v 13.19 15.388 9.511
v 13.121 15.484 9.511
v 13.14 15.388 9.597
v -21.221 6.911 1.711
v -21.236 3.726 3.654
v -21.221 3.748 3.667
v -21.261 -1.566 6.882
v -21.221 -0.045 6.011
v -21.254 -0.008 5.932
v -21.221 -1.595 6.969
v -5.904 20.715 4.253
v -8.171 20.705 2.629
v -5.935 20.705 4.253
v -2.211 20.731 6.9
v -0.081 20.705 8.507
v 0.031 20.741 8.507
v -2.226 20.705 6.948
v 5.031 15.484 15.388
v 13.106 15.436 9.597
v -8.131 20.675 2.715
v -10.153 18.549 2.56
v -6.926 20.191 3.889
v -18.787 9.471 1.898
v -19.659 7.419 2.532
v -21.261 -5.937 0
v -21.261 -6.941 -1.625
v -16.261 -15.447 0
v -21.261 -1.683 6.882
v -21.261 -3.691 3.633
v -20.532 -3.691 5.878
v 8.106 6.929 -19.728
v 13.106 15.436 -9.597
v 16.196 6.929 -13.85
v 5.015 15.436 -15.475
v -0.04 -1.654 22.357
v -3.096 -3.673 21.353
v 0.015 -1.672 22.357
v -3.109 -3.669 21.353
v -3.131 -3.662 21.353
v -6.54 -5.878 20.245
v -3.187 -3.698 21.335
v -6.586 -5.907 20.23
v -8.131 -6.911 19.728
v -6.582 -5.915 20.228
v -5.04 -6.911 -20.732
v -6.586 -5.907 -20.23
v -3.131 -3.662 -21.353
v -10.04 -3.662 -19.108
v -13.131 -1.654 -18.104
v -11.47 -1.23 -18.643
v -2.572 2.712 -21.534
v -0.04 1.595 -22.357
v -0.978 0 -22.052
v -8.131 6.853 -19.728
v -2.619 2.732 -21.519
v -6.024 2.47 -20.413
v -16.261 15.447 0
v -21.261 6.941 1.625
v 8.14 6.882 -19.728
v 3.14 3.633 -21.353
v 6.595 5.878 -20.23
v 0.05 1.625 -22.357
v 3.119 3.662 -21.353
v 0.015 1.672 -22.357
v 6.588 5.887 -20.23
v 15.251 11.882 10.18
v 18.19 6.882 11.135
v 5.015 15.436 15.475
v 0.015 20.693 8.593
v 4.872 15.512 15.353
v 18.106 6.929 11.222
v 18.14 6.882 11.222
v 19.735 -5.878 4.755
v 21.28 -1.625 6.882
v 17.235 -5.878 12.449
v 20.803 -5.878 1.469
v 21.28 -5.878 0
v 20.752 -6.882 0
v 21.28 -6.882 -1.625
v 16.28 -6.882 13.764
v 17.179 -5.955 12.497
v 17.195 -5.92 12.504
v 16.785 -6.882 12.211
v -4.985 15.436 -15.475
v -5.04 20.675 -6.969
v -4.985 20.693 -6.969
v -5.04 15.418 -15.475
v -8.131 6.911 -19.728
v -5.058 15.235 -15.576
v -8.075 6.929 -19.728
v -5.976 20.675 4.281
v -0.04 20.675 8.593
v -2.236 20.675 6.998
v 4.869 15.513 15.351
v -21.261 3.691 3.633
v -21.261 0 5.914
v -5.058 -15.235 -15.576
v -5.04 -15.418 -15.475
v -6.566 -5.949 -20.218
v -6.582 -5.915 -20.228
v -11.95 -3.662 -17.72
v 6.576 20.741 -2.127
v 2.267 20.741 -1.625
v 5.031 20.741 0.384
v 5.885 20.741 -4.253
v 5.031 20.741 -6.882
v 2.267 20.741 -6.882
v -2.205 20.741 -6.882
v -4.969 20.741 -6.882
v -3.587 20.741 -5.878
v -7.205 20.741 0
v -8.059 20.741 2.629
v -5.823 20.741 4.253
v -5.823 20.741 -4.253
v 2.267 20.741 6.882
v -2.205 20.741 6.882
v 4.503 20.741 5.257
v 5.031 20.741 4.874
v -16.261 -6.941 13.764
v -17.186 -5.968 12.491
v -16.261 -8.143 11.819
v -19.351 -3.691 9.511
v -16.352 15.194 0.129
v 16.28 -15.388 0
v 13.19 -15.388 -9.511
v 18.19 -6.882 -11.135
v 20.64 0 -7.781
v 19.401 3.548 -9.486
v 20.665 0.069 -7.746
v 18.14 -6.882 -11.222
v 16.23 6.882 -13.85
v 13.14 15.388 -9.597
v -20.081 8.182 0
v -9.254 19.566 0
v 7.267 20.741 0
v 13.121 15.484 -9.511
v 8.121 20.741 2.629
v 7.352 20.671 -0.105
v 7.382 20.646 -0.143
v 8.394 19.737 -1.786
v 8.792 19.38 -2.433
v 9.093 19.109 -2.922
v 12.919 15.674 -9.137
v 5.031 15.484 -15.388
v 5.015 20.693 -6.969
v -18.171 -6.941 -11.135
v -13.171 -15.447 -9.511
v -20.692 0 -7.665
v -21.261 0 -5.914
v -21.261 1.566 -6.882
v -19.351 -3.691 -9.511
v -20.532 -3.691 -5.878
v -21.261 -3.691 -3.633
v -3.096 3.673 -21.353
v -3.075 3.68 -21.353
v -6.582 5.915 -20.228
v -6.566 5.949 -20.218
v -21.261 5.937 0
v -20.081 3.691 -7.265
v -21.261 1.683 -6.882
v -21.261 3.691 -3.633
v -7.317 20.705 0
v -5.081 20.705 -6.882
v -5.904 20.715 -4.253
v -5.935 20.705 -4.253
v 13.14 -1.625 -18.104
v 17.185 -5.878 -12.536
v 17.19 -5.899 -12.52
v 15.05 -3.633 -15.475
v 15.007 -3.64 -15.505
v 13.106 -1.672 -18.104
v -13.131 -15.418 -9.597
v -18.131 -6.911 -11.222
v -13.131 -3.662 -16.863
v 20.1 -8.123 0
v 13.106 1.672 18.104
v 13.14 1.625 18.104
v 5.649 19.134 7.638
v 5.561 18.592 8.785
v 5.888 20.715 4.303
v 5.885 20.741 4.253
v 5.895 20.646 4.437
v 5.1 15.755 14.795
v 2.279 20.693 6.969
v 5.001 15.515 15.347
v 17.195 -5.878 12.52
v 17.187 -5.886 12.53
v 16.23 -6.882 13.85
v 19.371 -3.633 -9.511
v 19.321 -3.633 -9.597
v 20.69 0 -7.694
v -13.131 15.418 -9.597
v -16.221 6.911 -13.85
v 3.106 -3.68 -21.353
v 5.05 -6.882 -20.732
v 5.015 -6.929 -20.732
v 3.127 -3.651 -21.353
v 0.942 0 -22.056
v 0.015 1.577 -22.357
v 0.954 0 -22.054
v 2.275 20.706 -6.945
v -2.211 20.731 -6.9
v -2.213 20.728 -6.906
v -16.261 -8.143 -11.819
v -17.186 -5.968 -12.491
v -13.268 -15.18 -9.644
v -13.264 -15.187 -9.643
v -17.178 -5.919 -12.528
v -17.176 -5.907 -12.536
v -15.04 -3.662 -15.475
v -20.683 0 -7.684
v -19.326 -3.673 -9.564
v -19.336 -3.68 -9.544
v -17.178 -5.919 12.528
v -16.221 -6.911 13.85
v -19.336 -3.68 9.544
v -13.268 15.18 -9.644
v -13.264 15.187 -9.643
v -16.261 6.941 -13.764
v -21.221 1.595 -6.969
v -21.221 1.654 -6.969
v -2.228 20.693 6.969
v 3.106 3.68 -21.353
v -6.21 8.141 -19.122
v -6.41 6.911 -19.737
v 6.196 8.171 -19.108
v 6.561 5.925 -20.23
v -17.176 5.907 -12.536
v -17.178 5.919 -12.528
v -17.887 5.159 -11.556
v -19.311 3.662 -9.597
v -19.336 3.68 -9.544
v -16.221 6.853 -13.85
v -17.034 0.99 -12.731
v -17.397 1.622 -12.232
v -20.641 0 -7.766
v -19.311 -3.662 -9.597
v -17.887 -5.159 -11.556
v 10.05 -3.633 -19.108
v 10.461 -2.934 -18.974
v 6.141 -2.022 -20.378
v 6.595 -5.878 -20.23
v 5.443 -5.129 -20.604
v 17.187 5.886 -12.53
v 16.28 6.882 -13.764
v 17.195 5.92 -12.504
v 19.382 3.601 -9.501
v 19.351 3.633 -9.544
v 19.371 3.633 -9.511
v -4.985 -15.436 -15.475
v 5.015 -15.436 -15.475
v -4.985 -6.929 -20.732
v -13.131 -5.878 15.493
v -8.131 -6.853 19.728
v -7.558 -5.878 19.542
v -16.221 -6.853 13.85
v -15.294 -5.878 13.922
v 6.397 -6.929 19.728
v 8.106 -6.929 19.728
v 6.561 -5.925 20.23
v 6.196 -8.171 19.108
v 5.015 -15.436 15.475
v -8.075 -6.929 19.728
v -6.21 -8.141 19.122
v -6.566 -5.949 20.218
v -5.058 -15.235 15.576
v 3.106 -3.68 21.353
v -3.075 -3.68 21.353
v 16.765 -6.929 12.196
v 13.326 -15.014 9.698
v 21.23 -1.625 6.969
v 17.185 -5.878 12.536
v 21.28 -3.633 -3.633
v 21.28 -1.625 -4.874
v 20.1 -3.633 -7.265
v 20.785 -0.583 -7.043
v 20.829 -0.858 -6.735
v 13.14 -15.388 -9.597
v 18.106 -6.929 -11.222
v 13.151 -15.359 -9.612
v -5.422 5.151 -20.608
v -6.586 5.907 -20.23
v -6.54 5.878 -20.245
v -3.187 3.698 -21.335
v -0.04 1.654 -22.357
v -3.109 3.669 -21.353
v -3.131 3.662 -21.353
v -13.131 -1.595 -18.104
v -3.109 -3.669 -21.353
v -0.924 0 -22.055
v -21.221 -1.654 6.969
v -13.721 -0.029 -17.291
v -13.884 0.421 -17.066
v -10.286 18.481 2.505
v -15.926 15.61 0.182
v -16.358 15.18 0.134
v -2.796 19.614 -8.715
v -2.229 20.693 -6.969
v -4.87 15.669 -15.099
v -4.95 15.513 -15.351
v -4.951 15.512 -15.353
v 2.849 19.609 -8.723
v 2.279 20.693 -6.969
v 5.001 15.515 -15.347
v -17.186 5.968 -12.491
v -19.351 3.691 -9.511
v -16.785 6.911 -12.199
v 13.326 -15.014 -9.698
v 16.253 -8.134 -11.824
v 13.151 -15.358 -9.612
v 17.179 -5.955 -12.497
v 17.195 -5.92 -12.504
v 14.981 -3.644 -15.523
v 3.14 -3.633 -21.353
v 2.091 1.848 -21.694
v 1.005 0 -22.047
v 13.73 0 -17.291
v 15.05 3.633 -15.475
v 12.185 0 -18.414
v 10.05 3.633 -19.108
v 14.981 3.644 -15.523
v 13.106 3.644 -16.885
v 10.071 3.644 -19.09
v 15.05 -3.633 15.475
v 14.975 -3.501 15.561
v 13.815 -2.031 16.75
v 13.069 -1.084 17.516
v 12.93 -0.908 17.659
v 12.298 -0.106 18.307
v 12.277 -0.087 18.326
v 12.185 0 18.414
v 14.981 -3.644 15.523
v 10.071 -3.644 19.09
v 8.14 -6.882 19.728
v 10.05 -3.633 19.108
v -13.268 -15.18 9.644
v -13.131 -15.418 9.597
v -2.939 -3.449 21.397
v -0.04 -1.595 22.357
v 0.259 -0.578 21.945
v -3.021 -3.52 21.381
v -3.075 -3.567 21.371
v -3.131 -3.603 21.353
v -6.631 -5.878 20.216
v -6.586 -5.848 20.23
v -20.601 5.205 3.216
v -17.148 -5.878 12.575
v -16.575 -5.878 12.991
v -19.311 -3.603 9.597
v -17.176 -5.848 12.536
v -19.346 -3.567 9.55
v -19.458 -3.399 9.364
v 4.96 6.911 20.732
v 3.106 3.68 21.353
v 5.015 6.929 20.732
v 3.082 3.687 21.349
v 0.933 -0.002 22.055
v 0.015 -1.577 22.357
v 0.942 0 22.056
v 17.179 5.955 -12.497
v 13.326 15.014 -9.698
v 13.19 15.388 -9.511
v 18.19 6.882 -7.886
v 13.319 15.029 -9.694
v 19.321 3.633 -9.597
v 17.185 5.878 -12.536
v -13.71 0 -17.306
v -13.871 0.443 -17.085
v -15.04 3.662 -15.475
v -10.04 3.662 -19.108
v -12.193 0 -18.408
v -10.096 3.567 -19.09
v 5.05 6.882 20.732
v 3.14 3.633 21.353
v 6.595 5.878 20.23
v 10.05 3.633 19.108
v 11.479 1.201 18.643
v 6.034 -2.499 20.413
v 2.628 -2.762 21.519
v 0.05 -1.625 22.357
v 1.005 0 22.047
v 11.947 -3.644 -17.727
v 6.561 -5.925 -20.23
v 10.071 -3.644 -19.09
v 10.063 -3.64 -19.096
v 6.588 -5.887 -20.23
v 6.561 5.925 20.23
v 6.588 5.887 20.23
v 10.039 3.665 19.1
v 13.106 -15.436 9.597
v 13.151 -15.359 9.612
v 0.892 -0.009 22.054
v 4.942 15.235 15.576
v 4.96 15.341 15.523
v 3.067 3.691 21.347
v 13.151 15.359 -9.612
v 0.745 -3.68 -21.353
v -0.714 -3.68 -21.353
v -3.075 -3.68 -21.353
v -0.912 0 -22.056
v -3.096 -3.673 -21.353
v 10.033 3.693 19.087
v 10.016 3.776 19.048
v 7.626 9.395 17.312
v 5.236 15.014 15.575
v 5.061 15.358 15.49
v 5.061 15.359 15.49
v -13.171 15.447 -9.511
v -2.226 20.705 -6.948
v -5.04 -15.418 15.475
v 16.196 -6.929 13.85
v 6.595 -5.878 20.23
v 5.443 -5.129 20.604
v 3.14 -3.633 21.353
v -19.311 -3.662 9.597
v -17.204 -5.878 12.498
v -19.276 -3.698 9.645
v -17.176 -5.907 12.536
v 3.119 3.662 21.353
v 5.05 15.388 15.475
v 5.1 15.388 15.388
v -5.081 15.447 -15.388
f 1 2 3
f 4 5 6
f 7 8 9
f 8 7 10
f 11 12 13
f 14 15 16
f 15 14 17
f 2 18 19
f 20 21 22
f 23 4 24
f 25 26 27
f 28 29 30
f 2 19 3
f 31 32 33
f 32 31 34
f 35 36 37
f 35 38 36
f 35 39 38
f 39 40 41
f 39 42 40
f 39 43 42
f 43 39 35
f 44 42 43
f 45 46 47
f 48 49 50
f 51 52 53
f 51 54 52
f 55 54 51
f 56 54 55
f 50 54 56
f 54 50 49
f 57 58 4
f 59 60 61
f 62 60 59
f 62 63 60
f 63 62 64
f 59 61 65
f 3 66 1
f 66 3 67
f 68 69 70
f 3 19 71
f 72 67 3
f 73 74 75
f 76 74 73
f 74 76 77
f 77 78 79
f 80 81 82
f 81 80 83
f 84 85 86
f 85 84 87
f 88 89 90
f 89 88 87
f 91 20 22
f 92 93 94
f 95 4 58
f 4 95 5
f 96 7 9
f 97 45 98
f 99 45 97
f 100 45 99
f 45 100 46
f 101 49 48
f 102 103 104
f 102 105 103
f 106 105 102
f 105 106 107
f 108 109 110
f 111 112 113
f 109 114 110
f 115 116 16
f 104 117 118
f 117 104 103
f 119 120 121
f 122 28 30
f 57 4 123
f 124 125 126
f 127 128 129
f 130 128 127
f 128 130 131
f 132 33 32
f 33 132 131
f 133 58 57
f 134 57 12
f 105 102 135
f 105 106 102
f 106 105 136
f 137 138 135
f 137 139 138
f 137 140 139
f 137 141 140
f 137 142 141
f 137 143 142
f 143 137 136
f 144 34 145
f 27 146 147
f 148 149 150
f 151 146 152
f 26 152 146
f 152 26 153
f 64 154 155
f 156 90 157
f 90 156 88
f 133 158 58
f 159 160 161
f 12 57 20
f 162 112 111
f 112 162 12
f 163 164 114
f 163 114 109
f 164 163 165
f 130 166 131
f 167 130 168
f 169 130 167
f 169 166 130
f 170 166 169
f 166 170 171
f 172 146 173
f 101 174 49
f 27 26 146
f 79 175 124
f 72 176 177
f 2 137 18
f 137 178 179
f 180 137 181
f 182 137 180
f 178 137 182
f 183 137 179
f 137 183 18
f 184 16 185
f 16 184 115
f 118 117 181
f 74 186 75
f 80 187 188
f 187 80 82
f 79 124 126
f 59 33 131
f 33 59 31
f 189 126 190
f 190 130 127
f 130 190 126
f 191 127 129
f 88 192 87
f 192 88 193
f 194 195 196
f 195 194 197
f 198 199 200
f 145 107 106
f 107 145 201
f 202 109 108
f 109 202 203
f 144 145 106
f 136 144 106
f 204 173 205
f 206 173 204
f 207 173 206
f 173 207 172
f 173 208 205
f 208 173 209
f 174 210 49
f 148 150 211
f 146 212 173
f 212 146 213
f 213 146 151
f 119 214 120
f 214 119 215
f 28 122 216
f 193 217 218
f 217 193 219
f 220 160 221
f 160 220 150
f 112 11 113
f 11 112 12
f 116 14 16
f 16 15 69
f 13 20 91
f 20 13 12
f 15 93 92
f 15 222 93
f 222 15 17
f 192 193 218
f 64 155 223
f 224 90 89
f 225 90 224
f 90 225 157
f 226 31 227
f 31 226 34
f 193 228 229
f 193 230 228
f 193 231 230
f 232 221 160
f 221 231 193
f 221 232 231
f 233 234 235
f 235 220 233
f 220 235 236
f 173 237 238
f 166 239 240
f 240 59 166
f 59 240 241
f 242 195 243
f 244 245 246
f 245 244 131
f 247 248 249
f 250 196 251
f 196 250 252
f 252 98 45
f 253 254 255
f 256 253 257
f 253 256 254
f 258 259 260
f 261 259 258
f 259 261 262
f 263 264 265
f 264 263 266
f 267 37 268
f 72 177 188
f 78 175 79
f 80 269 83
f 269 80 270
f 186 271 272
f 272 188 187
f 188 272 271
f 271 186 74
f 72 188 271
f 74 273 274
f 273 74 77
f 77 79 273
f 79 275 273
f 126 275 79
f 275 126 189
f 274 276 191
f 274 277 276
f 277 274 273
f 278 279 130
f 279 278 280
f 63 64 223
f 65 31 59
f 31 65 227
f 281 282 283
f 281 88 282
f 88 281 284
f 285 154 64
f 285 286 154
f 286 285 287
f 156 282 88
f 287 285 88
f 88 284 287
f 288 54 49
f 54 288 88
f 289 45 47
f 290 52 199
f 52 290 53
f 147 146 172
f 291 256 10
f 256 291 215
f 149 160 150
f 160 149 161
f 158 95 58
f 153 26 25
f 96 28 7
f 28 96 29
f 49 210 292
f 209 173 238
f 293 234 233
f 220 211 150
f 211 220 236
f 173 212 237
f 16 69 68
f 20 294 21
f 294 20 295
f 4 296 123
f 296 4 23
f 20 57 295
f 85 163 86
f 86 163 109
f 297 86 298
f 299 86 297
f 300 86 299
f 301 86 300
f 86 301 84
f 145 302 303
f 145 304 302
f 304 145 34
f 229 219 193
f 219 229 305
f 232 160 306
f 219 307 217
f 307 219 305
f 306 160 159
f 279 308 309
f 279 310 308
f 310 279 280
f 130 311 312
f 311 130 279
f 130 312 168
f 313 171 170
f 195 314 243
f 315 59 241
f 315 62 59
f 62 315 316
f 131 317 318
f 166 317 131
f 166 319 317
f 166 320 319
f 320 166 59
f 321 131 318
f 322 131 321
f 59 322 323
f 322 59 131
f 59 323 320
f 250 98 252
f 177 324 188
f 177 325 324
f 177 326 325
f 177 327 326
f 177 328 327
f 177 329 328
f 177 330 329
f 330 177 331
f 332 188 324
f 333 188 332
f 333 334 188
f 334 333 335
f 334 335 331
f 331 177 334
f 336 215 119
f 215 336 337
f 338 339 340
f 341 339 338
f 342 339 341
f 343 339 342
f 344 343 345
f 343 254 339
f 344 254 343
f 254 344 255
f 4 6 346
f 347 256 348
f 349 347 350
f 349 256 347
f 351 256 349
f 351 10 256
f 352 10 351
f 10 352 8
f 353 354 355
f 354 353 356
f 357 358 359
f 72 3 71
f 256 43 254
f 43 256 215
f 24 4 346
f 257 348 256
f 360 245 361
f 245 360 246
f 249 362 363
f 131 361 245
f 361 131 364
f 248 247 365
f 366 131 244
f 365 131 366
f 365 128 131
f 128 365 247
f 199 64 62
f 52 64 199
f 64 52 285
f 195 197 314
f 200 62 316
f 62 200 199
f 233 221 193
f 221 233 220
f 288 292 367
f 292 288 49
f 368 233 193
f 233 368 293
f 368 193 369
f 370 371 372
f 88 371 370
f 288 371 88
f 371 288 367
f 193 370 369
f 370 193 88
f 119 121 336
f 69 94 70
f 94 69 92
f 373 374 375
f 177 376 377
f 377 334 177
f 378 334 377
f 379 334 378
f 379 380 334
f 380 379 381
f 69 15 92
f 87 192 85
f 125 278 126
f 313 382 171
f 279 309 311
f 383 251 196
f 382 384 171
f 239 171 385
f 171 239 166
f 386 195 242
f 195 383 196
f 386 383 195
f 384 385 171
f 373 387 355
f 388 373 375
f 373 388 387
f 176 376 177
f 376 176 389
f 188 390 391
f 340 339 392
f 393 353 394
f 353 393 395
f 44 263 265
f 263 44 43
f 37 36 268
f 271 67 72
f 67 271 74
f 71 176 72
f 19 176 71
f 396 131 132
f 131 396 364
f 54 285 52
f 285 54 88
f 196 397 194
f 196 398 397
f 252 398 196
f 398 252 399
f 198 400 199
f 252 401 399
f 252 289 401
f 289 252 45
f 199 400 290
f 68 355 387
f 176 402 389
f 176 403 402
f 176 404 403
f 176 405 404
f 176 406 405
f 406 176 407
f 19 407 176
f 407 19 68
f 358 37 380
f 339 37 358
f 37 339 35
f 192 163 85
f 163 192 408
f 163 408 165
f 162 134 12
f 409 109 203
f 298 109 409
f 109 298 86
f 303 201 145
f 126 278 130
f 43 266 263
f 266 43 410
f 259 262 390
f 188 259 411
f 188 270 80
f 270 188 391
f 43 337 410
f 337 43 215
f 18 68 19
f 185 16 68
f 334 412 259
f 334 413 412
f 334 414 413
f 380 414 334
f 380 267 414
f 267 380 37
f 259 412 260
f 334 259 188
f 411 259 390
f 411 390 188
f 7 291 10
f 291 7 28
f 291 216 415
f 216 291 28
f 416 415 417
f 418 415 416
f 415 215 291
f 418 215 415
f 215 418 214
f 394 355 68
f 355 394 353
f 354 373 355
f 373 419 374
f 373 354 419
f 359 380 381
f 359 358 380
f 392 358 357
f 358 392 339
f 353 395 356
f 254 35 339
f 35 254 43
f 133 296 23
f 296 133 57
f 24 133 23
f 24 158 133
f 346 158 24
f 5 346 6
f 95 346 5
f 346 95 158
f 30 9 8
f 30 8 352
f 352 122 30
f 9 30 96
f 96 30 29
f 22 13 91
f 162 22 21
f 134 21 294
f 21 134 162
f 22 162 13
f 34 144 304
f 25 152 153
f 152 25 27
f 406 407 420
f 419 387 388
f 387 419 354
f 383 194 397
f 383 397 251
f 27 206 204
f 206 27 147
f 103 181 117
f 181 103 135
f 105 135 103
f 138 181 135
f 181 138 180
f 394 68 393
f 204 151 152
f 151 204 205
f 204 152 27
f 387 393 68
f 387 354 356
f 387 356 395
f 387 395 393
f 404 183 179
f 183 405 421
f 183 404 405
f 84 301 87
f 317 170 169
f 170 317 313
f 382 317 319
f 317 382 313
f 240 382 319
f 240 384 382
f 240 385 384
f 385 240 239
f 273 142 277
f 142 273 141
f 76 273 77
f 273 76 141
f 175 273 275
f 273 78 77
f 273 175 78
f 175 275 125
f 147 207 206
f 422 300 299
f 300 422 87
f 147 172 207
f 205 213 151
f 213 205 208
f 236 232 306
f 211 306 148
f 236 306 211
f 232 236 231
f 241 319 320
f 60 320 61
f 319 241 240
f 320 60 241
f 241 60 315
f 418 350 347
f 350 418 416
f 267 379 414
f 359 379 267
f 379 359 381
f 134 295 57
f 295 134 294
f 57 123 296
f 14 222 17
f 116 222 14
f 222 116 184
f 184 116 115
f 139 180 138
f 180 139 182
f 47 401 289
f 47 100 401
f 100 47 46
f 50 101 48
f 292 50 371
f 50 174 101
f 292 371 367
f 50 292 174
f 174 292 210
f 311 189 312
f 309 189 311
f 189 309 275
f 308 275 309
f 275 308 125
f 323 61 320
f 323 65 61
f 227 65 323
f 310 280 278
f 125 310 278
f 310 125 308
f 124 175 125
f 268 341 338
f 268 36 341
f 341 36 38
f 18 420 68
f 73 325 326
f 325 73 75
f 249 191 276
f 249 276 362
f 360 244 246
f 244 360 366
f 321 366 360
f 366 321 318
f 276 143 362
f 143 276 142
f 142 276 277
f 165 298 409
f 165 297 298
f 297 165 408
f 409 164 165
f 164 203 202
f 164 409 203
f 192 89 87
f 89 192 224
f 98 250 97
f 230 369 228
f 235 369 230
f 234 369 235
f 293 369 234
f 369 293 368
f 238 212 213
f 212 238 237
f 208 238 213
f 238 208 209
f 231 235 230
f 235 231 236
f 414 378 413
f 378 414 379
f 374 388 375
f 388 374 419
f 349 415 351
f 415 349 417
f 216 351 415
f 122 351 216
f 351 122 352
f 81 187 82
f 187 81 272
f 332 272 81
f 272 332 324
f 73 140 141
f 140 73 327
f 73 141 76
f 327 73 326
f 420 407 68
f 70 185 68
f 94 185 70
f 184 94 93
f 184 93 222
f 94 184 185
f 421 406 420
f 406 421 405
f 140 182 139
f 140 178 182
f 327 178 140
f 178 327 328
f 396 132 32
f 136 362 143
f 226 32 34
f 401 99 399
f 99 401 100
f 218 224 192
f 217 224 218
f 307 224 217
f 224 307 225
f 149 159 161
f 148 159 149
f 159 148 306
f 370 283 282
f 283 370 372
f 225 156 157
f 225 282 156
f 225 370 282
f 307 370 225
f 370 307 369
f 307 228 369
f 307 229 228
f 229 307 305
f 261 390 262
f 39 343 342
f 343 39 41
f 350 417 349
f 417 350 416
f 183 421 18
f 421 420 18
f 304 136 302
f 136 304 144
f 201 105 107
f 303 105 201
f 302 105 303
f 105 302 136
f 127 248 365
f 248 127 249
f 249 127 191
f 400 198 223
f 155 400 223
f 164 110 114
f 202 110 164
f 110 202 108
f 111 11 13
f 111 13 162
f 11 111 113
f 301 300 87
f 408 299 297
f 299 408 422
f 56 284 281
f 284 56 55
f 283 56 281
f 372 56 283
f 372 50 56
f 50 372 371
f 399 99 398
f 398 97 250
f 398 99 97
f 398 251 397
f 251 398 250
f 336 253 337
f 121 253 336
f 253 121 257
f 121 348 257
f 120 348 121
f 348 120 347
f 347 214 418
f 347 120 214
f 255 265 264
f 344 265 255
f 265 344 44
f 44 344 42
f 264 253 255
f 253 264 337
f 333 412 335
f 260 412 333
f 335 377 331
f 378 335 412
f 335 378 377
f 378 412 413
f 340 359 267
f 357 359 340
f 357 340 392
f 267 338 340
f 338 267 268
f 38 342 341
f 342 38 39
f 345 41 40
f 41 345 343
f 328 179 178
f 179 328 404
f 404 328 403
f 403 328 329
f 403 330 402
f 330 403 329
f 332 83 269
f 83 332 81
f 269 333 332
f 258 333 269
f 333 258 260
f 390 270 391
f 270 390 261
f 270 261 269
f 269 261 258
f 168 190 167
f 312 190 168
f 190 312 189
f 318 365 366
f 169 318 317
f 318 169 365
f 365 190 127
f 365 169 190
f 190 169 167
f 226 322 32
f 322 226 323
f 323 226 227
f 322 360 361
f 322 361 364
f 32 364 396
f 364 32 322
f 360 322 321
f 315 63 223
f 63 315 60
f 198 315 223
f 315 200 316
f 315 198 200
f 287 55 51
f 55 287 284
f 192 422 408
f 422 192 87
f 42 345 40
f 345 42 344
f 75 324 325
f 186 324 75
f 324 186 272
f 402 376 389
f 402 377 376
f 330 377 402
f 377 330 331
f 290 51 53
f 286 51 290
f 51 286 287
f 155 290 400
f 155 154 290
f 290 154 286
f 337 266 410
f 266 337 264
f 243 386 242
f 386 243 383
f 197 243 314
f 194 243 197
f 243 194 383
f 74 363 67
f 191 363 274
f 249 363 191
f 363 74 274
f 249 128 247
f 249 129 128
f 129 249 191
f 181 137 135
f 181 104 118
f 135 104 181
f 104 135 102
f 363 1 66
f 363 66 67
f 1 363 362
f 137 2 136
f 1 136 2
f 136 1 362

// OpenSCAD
// Auto-generated OpenSCAD file

    inner_points = 10*[[1.30901696039044, -1.5388417782265715, 0.9510565474746461], [-2.1180339733846583, 0.6881910044632044, -0.16245986108672694], [1.8090169796137625, -0.6881909777335578, 1.1135163775781873], [-1.6180339541613356, 1.5388418049562185, -3.0983185683730596e-08], [1.6180339541612156, -1.538841804956286, 3.0983185683730596e-08], [-1.8090169796138824, 0.68819097773349, -1.1135163775781873], [2.1180339733845384, -0.6881910044632721, 0.16245986108672694], [-1.30901696039056, 1.538841778226504, -0.9510565474746461], [-0.5000000141570125, -0.6881909060497494, 2.064572895340174], [-1.3090169968820657, -0.16245978121444532, 1.801707328858261], [5.066310430925828e-09, 0.1624598944432645, 2.227032725443715], [-0.8090169776587427, 0.6881910192785686, 1.9641671589618024], [0.809016977658623, -0.6881910192786364, -1.9641671589618024], [-5.066430170716978e-09, -0.16245989444333217, -2.227032725443715], [1.3090169968819458, 0.16245978121437765, -1.801707328858261], [0.5000000141568928, 0.6881909060496817, -2.064572895340174], [-1.618034023338573, -1.5388417322190338, 3.303893986172923e-08], [0.5000000468426242, 2.0645728837839843, 0.6881909169706076], [-1.3090170295677974, -1.538841758948748, -0.9510564834525206], [0.8090170406134, 2.06457285705427, -0.26286559952085276], [-2.118033992838755, -0.16245981482511987, -0.6881909555105802], [-0.8090169481364942, 2.064572893422896, -0.26286559849297564], [0.49999998584298705, -0.6881909285267964, 2.0645728947049107], [-1.6180339724070885, 0.6881910252357436, 1.376381907183268], [1.6180339724069686, -0.6881910252358113, -1.376381907183268], [-0.49999998584310684, 0.6881909285267287, -2.0645728947049107], [-1.3090170283594544, -1.5388417193808985, 0.9510565491377863], [0.5000000355661287, 1.5388417893601316, 1.5388417362589322], [-0.5000000355662484, -1.538841789360199, -1.5388417362589322], [1.3090170283593345, 1.538841719380831, -0.9510565491377863], [0.4999999663888912, -1.5388417478151206, 1.5388418002810578], [-2.118033984661154, 0.16245991003935126, 0.6881909582015976], [1.3090169918678283, -0.16245984006011832, 1.8017073271951207], [-1.309016959182217, 1.5388418177943537, 0.9510564851156607], [1.309016959182097, -1.5388418177944212, -0.9510564851156607], [-1.3090169918679482, 0.16245984006005065, -1.8017073271951207], [2.118033984661034, -0.16245991003941893, -0.6881909582015976], [-0.499999966389011, 1.5388417478150531, -1.5388418002810578], [-0.5000000336111086, -1.5388417253380735, 1.5388418009163205], [-1.8090170091361313, -0.6881908964108379, 1.1135163798765904], [0.8090170110911518, 0.6881909829099426, 1.9641671579339253], [-0.49999996443387096, 1.5388418118371785, 1.5388417368941951], [0.49999996443375117, -1.538841811837246, -1.5388417368941951], [-0.8090170110912714, -0.6881909829100104, -1.9641671579339253], [1.8090170091360114, 0.6881908964107701, -1.1135163798765904], [0.5000000336109889, 1.538841725338006, -1.5388418009163205], [-2.1180340041152497, -0.688190909248973, 0.16245986377774424], [-0.49999995315737555, 2.064572906261031, 0.6881909176058706], [-1.6180340050928197, -0.6881909524985592, -1.3763819051275137], [4.586505433710224e-08, 2.064572863011445, -0.8506508512993872]];

    outer_points = 10*[[-0.8090170110916863, -0.6881908812857832, 1.9641671935400922], [1.3090170295679837, 1.538841709741917, -0.95105656307045], [-0.5000000355665741, -1.538841709741917, 1.5388418158770538], [1.6180340050930957, 0.6881908812857832, -1.3763819407334883], [-1.6180340050930957, -0.6881908812857832, 1.3763819407334883], [0.5000000355665741, 1.538841709741917, -1.5388418158770538], [-1.3090170295679837, -1.538841709741917, 0.95105656307045], [0.8090170110916863, 0.6881908812857832, -1.9641671935400922], [1.3090169968815815, 0.1624598744330541, 1.8017073204530507], [1.809017009135817, 0.6881909540230795, 1.113516344270661], [1.6180339724066932, -0.6881909540230795, 1.3763819427900126], [2.118033984660929, -0.1624598744330541, 0.6881909666076228], [-2.118033984660929, 0.1624598744330541, -0.6881909666076228], [-1.6180339724066932, 0.6881909540230795, -1.3763819427900126], [-1.809017009135817, -0.6881909540230795, -1.113516344270661], [-1.3090169968815815, -0.1624598744330541, -1.8017073204530507], [4.5864941067286225e-08, 2.06457290702336, 0.8506507444803071], [1.309016960390704, -1.5388418274333344, -0.9510564678560931], [-0.8090169481364684, 2.06457290702336, 0.26286549167370316], [0.4999999663892946, -1.5388418274333344, -1.538841720662697], [0.5000000468428755, 2.064572848177651, -0.6881910237895683], [1.3090169918683128, -0.16245993327876307, -1.8017073187892874], [0.8090169776582082, -0.6881909176544313, 1.9641671945683543], [2.118034004115161, 0.6881909176544313, 0.1624598281718883], [-2.118034004115161, -0.6881909176544313, -0.1624598281718883], [-0.8090169776582082, 0.6881909176544313, -1.9641671945683543], [0.5000000336107052, 1.5388418049562738, 1.538841721298198], [1.6180339541612545, -1.5388418049562738, 4.863544078581583e-08], [-1.6180339541612545, 1.5388418049562738, -4.863544078581583e-08], [-0.5000000336107052, -1.5388418049562738, -1.538841721298198], [-5.066900010675113e-09, -0.16245977921869703, 2.227032733849236], [1.6180340233385344, 1.5388417322189776, -4.657891639059386e-08], [0.4999999644334254, -1.5388417322189776, 1.538841816512555], [2.1180339928388596, 0.16245977921869703, -0.6881909639155974], [-2.1180339928388596, -0.16245977921869703, 0.6881909639155974], [-0.4999999644334254, 1.5388417322189776, -1.538841816512555], [-1.6180340233385344, -1.5388417322189776, 4.657891639059386e-08], [5.066900010675113e-09, 0.16245977921869703, -2.227032733849236], [0.5000000141564732, 0.6881910128687885, 2.0645728597339326], [1.3090170283591904, 1.5388417685876257, 0.9510564695198562], [1.3090169591819105, -1.5388417685876257, 0.9510565647342133], [2.1180339733846276, -0.6881910128687885, -0.16245982547986293], [-2.1180339733846276, 0.6881910128687885, 0.16245982547986293], [-1.3090169591819105, 1.5388417685876257, -0.9510565647342133], [-1.3090170283591904, -1.5388417685876257, -0.9510564695198562], [-0.5000000141564732, -0.6881910128687885, -2.0645728597339326], [0.8090170406134262, 2.064572870654712, 0.26286549270196535], [1.8090169796140771, -0.6881910353458492, -1.1135163419713967], [-0.4999999531571243, 2.064572870654712, -0.6881910244250694], [0.4999999858435267, -0.6881910353458492, -2.0645728590984316]];

    // Convex hull for inner set (I)
    module inner_hull() {
        hull() {
            for (p = inner_points) {
                translate(p) sphere(r=0.1);
            }
        }
    }

    // Convex hull for outer set (O) minus inner hull (O \ I)
    module outer_minus_inner() {
        difference() {
            hull() {
                for (p = outer_points) {
                    translate(p) sphere(r=0.1);
                }
            }
            inner_hull(); // Subtract inner hull
        }
    }

    // Convex hull for outer set (O) minus all translated inner hulls
    module outer_minus_AllTranslationInner() {
        difference() {
            hull() {
                for (p = outer_points) {
                    translate(p) sphere(r=0.1);
                }
            }
            hull() {
                translate([0,0,50]) inner_hull();
                translate([0,0,-50]) inner_hull();
            }; // Subtract translated inner hulls
        }
    }

    // Difference between outer_minus_inner and outer_minus_AllTranslationInner
    module outer_minus_inner_diff() {
        difference() {
            // Outer minus inner
            difference() {
                hull() {
                    for (p = outer_points) {
                        translate(p) sphere(r=0.1);
                    }
                }
                inner_hull();
            }

            // Subtract Outer minus AllTranslationInner
            difference() {
                hull() {
                    for (p = outer_points) {
                        translate(p) sphere(r=0.1);
                    }
                }
                hull() {
                    translate([0,0,50]) inner_hull();
                    translate([0,0,-50]) inner_hull();
                };
            }
        }
    }

    // Rendering all with colors applied
    color([1, 1, 0, 1]) outer_minus_inner_diff(); // Opaque yellow
    
